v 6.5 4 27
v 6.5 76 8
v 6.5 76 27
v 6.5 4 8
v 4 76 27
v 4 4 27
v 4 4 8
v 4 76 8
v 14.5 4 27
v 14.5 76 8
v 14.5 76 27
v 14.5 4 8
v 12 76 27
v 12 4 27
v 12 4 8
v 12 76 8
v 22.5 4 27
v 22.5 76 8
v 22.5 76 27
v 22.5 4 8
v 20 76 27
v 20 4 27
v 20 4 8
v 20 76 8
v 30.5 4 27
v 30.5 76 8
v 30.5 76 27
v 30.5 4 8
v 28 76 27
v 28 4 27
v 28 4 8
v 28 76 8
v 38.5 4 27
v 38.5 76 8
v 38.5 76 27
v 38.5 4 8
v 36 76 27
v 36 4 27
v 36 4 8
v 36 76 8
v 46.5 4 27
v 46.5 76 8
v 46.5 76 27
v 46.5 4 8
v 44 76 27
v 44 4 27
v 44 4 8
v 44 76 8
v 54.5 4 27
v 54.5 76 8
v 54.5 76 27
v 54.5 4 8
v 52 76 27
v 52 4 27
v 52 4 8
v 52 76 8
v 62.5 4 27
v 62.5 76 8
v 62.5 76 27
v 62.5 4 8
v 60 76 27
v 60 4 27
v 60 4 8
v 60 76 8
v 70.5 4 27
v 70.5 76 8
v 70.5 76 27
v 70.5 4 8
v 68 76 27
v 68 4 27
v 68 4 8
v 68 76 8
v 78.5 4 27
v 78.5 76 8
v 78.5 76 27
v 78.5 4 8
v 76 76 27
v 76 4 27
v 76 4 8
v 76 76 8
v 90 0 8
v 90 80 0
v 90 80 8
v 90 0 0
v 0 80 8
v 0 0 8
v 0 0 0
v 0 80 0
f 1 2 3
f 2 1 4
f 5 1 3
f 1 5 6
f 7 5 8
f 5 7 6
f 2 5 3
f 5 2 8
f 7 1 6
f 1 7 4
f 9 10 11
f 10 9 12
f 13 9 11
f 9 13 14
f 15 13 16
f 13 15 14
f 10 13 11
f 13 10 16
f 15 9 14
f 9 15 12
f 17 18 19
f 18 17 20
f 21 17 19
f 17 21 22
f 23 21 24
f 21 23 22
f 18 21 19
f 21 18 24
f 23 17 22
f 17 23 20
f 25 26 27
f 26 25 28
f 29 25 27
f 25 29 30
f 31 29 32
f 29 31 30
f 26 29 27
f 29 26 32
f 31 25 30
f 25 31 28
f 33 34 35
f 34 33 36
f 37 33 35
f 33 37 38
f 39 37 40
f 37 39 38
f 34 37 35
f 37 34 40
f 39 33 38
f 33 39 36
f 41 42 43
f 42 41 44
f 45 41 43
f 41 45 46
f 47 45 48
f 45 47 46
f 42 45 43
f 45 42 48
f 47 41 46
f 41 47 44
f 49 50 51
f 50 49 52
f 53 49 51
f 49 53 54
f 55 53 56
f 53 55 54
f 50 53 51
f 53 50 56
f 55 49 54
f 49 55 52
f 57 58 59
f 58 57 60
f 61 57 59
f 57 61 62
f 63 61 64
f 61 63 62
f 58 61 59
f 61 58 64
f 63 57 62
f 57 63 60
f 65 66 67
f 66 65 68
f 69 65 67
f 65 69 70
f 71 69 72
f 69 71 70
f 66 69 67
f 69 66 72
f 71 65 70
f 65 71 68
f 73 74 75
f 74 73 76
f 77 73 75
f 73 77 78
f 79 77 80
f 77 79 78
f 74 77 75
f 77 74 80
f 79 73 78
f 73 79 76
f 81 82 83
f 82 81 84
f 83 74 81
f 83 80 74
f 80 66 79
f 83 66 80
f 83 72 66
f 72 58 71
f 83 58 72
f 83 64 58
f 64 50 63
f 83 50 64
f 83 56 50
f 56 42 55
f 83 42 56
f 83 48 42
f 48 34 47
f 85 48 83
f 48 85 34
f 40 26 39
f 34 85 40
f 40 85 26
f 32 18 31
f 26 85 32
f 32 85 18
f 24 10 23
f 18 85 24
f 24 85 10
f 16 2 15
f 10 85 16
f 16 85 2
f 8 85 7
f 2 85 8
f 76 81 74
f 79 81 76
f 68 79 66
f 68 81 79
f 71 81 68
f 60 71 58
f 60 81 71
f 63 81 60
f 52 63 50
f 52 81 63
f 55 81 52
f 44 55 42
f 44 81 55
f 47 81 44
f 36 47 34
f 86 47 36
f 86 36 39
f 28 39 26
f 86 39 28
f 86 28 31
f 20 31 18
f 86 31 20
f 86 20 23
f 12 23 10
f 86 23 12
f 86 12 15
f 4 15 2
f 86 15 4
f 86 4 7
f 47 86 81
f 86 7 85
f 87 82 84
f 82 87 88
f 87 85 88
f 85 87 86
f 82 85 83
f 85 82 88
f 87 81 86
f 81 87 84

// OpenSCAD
$fn = 32;

// ----------------------------------------------------------------------
// Heatsink: uniform fin block
// ----------------------------------------------------------------------

// --- parameters (mm) ---
base_l = 90;              // base length, X
base_w = 80;              // base width, Y
base_t = 8;               // base plate thickness
fin_h = 20;               // fin height above the base
fin_t = 2.5;              // fin thickness
edge = 4;                 // margin from the base ends
pitch = 8;                // fin pitch

n_fins = floor((base_l - 2 * edge - fin_t) / pitch) + 1;  // fin count
total_h = base_t + fin_h - 1;  // overall height

union() {
  cube([base_l, base_w, base_t]);
  for (i = [0 : n_fins - 1])
    translate([edge + i * pitch, edge, base_t - 1])
      cube([fin_t, base_w - 2 * edge, fin_h]);
}
